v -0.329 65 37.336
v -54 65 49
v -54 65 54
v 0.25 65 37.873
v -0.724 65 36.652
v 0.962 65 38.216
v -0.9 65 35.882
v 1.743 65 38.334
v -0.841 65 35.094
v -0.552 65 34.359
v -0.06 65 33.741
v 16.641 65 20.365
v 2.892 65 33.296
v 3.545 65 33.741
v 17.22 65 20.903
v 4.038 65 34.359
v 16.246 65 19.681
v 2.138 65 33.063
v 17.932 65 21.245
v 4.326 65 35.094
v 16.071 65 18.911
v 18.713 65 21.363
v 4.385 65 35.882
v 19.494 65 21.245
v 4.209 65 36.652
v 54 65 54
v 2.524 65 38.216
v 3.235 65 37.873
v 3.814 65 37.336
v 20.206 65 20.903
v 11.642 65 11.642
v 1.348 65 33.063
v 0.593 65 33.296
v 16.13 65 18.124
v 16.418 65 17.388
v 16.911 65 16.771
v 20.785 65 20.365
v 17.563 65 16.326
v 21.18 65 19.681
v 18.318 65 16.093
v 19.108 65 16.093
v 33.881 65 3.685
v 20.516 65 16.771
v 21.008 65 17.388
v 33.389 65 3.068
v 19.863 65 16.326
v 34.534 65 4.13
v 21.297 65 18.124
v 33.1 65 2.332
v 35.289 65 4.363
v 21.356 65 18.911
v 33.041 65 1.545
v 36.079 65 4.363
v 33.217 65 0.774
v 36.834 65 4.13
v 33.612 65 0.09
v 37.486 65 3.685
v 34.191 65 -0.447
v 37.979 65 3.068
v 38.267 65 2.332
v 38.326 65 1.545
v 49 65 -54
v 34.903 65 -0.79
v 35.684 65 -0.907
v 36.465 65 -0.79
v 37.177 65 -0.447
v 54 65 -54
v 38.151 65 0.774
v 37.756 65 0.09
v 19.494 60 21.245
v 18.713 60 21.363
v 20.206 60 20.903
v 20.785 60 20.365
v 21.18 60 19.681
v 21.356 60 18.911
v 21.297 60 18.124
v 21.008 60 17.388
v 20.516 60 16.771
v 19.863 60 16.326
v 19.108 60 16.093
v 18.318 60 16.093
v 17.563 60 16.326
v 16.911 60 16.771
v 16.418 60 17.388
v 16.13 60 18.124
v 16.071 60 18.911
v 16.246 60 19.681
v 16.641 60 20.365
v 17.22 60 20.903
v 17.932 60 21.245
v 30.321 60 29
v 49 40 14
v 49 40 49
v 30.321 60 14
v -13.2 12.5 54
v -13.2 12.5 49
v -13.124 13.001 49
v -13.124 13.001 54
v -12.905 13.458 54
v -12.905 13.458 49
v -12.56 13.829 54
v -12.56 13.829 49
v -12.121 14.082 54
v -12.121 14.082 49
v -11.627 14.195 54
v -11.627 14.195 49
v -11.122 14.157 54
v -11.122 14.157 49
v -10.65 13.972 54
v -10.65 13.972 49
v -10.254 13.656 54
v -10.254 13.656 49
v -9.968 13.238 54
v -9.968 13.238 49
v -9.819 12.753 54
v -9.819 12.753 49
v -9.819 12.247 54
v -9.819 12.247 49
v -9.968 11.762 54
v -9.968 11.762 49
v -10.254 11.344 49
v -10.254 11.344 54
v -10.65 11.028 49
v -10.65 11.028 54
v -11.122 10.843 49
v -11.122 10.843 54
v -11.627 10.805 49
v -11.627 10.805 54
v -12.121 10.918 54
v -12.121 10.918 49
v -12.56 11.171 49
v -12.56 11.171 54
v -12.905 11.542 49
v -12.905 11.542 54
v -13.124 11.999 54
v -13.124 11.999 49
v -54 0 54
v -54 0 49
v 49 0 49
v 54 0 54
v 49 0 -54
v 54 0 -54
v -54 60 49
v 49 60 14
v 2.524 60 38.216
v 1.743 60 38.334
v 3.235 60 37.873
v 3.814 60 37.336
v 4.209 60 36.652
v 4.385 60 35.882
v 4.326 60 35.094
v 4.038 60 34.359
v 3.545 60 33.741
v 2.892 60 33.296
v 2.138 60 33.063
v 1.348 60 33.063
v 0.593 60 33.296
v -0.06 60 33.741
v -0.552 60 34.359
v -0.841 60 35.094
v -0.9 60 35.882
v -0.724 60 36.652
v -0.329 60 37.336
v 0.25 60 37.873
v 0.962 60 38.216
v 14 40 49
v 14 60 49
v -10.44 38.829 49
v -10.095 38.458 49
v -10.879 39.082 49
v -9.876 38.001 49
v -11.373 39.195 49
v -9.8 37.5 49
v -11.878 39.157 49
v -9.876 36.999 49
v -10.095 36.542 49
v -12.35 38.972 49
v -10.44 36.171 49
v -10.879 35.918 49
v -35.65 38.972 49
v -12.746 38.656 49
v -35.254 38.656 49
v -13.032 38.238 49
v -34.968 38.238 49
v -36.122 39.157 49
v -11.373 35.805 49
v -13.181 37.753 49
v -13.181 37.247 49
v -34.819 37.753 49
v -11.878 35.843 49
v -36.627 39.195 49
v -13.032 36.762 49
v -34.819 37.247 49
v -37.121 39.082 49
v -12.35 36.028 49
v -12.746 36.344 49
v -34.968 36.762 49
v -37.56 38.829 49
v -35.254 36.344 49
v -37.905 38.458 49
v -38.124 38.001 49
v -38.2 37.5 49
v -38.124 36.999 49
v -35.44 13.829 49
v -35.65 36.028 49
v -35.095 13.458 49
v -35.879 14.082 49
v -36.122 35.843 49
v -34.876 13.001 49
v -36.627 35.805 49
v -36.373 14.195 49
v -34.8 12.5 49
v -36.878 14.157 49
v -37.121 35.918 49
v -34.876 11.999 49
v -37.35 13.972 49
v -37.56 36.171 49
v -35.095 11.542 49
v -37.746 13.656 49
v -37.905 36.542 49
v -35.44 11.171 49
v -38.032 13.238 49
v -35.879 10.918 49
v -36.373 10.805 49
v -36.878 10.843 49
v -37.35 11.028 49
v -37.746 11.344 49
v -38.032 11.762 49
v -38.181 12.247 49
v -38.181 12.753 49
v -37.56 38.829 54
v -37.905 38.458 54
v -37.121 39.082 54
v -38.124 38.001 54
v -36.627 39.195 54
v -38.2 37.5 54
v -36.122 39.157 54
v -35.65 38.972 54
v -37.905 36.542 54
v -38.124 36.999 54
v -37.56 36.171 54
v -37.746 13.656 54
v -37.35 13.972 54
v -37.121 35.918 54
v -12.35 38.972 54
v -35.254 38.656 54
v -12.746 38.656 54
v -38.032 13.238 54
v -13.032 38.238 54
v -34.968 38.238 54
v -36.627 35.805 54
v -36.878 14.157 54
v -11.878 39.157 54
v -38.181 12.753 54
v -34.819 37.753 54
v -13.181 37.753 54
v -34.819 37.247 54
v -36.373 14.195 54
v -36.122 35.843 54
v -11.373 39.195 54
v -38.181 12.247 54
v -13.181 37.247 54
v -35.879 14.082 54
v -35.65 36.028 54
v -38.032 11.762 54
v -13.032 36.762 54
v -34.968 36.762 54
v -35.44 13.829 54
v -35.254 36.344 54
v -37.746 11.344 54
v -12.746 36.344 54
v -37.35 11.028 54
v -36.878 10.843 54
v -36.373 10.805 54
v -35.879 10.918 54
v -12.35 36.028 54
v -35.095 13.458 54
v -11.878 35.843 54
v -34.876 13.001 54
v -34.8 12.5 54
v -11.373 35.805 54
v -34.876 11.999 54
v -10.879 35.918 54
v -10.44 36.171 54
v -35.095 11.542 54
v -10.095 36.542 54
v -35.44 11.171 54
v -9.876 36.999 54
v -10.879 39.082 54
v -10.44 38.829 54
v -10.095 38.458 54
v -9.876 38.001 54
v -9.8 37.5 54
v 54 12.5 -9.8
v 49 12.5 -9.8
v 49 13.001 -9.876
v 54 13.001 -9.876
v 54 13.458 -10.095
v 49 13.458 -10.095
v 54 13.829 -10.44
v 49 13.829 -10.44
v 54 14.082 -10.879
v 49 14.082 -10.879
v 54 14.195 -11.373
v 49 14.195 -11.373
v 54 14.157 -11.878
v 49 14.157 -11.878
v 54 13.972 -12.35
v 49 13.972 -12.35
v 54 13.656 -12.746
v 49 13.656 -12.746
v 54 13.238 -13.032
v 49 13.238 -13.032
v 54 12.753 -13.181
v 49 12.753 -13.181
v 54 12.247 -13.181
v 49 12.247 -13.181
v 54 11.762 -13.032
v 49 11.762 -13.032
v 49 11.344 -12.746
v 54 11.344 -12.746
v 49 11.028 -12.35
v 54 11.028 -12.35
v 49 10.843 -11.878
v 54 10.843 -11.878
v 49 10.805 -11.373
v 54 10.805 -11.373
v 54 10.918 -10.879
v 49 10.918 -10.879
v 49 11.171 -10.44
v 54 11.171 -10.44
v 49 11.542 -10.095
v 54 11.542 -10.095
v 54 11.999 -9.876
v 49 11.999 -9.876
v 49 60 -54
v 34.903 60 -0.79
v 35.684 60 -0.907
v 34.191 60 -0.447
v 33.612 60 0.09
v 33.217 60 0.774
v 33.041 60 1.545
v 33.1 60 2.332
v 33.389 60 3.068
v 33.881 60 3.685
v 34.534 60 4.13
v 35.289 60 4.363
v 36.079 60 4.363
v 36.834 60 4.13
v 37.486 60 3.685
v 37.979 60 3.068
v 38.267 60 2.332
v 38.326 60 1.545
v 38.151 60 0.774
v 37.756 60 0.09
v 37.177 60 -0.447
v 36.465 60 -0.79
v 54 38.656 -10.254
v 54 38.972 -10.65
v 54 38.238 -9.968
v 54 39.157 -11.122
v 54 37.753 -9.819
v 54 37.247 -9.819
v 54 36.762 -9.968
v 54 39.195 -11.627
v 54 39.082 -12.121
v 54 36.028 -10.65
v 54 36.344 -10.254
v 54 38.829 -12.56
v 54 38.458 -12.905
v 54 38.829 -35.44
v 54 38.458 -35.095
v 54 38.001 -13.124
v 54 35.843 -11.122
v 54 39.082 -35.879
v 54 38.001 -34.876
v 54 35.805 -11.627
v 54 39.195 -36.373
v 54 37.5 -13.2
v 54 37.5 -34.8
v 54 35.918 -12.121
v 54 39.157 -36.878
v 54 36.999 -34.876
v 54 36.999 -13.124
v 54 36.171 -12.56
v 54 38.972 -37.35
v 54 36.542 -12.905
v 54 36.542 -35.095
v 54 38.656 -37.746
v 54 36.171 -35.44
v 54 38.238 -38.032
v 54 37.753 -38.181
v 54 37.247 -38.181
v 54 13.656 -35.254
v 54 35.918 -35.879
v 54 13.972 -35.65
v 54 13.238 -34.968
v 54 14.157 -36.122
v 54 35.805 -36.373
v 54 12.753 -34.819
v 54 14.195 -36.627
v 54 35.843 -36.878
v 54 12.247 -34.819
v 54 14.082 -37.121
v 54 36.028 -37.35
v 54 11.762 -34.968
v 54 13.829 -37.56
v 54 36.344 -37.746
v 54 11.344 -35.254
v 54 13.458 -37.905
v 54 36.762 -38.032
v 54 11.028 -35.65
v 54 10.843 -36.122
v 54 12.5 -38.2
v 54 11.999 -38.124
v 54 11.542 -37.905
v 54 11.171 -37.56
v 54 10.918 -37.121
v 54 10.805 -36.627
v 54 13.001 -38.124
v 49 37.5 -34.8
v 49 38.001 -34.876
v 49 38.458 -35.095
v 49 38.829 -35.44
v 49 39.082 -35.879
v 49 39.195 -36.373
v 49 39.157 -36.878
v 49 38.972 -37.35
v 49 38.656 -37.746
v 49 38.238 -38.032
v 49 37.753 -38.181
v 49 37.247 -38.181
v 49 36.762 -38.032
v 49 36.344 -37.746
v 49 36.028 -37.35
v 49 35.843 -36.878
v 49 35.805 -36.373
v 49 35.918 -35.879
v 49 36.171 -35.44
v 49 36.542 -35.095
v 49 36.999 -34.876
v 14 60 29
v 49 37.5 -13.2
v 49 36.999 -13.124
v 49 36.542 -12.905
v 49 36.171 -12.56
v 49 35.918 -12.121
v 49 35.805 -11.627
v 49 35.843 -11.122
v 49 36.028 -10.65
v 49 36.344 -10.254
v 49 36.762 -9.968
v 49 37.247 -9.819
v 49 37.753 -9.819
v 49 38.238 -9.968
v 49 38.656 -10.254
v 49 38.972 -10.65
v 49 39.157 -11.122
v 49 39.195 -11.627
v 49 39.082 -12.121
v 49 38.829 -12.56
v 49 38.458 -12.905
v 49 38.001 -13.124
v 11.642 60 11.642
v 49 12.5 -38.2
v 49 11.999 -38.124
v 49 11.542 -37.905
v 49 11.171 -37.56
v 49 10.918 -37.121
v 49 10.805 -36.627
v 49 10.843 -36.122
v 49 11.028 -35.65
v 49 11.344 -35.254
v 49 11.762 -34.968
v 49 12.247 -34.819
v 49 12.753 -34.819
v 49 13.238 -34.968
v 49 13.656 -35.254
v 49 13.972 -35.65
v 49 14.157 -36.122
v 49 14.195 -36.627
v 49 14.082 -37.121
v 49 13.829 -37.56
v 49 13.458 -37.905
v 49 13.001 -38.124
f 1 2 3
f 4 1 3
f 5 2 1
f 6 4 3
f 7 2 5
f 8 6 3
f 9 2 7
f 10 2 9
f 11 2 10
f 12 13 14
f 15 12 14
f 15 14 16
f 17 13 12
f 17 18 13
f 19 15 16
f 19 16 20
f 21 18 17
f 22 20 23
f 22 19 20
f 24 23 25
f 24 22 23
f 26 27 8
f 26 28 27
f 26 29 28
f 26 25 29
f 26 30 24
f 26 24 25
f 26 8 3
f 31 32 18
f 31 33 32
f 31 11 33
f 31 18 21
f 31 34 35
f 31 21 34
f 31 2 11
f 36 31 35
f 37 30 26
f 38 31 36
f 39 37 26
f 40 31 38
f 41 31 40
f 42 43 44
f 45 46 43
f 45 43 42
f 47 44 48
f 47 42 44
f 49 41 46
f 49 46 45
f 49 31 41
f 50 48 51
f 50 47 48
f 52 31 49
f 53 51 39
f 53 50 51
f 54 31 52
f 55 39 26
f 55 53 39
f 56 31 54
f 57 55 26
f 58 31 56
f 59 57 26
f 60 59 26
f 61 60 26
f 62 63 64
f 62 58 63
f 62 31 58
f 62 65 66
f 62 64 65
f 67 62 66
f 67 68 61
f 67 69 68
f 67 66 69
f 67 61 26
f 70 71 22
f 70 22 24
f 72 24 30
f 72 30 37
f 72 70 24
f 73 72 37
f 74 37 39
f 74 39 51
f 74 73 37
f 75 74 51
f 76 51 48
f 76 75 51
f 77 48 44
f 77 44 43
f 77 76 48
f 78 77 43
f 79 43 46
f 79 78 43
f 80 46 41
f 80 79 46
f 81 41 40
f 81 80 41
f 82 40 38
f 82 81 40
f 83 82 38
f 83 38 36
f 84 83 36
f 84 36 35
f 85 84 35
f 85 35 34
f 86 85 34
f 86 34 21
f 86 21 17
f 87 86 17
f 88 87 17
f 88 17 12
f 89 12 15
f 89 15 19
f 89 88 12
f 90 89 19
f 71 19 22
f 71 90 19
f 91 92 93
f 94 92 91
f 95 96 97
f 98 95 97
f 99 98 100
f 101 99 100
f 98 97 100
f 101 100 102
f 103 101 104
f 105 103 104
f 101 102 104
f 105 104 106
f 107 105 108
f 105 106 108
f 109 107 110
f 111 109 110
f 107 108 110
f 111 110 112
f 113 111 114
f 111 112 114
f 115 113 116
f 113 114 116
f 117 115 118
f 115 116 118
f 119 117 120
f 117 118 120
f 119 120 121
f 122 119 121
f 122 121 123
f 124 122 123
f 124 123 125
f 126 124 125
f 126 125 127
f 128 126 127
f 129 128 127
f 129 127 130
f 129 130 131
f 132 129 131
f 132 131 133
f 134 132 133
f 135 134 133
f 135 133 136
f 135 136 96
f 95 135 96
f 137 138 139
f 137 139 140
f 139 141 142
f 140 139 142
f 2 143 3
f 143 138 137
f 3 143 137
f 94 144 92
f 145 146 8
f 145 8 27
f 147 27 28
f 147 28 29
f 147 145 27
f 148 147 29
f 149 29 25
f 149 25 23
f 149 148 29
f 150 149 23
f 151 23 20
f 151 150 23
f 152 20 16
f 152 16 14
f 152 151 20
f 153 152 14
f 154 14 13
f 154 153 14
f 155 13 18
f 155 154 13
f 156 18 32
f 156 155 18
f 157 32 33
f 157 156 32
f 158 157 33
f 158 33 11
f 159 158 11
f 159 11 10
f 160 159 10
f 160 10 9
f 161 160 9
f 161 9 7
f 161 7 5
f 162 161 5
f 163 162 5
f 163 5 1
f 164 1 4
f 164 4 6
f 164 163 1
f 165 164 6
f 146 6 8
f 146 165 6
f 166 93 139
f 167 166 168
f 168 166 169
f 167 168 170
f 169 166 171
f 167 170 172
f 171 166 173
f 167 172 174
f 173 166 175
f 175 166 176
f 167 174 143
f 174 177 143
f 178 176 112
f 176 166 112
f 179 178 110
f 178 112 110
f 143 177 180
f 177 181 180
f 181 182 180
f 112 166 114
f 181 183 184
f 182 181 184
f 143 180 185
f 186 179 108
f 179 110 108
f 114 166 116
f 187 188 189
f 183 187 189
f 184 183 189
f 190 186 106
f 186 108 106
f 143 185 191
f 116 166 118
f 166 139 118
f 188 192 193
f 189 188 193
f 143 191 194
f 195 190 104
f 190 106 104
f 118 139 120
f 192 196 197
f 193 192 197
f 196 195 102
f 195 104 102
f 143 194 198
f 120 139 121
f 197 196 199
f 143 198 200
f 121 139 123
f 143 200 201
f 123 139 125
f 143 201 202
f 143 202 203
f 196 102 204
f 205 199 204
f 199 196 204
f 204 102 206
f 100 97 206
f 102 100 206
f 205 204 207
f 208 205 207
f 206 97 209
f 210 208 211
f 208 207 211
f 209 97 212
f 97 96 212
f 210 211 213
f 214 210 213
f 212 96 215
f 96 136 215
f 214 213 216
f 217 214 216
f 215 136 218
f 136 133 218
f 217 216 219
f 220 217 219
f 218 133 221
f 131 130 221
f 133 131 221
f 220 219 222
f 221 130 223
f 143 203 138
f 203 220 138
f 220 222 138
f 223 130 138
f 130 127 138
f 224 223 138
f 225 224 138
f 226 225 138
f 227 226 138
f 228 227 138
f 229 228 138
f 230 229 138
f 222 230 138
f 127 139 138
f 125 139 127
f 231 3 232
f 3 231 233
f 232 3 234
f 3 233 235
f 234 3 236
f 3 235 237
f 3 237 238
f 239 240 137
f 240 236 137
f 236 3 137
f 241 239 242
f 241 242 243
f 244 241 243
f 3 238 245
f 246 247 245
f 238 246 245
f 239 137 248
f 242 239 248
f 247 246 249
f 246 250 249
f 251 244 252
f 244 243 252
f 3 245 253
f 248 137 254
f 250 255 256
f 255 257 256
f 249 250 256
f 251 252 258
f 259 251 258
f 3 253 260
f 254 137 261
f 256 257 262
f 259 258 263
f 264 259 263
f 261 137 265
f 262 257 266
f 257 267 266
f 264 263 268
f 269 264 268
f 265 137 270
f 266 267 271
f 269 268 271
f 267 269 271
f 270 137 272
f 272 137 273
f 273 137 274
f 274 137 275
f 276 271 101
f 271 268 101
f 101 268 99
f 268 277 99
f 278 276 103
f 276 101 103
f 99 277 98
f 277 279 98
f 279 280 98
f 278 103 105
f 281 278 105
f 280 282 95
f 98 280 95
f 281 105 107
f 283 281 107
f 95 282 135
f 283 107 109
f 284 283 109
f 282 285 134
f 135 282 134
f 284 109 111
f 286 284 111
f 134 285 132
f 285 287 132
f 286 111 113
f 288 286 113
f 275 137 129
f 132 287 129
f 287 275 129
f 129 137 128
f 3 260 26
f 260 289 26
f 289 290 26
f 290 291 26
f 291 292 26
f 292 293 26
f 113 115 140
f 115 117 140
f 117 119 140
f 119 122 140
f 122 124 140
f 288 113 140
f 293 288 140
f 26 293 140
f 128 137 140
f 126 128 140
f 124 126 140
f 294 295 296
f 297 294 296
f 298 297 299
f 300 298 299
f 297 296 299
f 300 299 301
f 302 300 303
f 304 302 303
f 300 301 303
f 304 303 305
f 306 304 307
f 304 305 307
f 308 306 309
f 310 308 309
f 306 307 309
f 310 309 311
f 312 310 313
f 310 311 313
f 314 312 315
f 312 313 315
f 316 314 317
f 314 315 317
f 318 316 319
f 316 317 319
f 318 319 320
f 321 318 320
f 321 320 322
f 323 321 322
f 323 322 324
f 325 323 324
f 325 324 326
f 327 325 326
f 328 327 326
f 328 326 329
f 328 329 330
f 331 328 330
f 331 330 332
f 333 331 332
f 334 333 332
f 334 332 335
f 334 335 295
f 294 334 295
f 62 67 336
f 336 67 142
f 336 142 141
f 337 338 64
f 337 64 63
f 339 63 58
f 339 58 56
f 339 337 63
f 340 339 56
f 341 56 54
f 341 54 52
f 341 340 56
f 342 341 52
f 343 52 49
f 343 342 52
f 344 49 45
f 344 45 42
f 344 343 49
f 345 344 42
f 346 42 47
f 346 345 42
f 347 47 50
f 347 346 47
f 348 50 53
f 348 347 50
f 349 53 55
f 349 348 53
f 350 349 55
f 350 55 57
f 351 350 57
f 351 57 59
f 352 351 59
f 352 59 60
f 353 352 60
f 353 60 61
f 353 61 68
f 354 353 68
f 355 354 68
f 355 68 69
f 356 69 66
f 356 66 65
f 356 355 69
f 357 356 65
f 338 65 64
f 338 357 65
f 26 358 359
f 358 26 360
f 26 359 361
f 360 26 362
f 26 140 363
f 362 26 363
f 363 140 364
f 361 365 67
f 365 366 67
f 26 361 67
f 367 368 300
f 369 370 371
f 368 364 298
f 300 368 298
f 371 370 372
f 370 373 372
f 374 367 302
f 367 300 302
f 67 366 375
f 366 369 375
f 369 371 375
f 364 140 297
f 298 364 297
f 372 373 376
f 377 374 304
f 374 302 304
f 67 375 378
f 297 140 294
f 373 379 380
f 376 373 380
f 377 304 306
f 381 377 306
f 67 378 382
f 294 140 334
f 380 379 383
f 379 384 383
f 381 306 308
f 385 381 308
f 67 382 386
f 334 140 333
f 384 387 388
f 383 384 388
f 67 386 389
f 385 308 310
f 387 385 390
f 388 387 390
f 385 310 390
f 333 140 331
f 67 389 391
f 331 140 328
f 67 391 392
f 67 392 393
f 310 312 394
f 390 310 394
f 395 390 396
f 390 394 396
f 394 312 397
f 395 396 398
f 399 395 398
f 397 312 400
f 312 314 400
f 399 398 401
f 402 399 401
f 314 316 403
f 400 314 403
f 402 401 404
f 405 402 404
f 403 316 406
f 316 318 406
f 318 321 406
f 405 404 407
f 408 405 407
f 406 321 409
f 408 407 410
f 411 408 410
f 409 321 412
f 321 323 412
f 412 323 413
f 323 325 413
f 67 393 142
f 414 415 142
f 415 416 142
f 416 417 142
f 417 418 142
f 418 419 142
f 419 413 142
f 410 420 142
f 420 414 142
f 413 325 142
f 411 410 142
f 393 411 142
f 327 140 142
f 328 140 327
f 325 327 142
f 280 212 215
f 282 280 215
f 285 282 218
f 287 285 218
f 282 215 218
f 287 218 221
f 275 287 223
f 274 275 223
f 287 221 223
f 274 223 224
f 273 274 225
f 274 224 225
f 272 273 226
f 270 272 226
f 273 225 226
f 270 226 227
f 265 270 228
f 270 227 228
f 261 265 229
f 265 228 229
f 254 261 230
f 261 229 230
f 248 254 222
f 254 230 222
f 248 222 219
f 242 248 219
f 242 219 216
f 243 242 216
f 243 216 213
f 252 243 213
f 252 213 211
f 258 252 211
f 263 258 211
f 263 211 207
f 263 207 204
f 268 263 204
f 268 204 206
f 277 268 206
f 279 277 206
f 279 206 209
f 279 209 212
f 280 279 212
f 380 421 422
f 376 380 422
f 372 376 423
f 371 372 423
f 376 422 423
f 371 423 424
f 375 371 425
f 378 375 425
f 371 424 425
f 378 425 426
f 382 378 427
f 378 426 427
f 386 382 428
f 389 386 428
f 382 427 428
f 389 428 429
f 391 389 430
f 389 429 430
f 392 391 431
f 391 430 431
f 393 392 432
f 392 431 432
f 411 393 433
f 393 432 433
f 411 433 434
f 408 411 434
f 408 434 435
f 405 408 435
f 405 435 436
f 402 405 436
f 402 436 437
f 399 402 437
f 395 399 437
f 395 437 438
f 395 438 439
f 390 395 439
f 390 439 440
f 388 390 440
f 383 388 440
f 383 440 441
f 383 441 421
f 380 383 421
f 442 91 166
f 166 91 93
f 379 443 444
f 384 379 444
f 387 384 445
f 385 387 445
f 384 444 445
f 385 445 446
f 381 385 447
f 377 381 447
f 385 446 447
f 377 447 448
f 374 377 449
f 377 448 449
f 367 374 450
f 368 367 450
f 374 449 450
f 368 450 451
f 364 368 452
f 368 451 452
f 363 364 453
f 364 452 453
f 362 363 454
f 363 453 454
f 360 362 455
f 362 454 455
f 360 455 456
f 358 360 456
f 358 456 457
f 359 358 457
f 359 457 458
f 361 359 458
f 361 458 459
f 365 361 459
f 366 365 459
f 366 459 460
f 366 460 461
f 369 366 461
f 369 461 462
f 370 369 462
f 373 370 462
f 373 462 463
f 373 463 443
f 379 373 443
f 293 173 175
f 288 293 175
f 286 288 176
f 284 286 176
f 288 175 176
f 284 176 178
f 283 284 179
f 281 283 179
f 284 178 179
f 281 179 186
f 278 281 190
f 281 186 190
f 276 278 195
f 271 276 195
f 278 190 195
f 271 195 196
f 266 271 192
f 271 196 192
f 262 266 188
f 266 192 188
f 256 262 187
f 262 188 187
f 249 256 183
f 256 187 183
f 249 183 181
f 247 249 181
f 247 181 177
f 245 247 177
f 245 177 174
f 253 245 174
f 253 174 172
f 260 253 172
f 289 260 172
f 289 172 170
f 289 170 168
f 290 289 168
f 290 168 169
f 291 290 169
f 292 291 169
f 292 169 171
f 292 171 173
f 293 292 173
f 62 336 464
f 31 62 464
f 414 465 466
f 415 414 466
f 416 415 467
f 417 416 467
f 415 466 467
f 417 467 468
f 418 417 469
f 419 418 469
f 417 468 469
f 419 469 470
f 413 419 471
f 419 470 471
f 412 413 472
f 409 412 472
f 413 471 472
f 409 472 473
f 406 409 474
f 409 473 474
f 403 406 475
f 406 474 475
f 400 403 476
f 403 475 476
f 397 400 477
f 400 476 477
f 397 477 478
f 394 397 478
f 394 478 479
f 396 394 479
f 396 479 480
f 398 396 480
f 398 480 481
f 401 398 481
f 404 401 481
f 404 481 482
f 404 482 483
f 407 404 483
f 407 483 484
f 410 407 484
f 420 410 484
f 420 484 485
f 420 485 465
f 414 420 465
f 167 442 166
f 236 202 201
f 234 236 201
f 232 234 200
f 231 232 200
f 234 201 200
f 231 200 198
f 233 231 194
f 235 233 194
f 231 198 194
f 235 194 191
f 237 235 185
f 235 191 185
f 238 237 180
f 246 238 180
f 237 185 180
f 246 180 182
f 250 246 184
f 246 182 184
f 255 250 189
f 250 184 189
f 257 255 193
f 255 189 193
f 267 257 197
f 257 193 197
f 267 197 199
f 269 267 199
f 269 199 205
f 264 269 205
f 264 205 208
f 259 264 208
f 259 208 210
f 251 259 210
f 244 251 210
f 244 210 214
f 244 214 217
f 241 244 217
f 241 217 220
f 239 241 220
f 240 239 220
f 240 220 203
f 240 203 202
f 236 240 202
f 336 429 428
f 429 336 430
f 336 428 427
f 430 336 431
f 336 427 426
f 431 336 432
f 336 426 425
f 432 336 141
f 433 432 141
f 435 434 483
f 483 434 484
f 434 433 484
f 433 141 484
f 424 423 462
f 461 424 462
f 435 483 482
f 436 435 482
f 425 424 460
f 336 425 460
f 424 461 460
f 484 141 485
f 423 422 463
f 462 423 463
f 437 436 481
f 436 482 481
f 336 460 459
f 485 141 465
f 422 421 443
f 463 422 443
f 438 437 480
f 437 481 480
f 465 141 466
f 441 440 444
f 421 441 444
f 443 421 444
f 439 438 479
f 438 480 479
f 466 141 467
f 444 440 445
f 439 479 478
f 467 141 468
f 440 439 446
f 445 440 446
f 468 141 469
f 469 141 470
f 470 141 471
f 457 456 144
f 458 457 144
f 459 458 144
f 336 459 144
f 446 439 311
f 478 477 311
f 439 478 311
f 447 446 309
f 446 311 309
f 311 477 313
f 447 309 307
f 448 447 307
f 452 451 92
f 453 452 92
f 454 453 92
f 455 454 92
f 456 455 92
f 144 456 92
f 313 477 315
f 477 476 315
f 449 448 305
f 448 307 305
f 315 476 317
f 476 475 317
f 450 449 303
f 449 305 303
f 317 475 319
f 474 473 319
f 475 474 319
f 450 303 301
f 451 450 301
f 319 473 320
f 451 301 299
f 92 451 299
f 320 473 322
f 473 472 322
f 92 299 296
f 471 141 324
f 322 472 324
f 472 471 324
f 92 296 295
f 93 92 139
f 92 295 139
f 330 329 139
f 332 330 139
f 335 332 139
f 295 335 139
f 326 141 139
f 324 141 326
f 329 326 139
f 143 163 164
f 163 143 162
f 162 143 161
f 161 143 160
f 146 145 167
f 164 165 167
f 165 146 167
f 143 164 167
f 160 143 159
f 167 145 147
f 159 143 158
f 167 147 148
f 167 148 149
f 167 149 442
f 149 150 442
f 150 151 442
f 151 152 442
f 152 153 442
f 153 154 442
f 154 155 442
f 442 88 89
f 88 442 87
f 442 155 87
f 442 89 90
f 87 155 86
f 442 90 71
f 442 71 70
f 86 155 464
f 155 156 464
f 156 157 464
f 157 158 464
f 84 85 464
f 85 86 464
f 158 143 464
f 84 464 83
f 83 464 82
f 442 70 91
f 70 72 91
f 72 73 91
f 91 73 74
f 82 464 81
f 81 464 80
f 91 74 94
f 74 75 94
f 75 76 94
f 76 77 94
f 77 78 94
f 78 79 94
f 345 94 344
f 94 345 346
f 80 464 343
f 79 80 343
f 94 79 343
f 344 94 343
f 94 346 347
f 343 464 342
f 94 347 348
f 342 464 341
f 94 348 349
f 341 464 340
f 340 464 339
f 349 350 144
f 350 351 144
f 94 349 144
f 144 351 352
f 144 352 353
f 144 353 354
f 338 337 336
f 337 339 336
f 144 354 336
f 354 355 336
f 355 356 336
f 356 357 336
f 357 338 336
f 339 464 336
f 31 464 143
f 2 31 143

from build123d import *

# Parameters (mm, degrees)
EXTRUDE_2_DEPTH     = 60
SKETCH_4_R          = 1.7
CUT_EXTRUDE_1_DEPTH = 131.862523283
SKETCH_5_R          = 1.7
CUT_EXTRUDE_2_DEPTH = 131.862523283
SKETCH_6_R          = 2.65
EXTRUDE_4_DEPTH     = 5
RIB_1_REACH         = 110.467
RIB_4_REACH         = 110.467
SKETCH_13_WALL_W    = 247.21744068
SKETCH_13_WALL_H    = 35


with BuildPart() as part:
    # 草图3 → 凸台-拉伸2 (new body)
    with BuildSketch(Plane(origin=(0, 0, 0), x_dir=(1, 0, 0), z_dir=(0, 1, 0))):
        Polygon((54, 54), (49, 54), (49, -49), (-54, -49), (-54, -54), (54, -54), align=None)
    extrude(amount=EXTRUDE_2_DEPTH)

    # 草图4 → 切除-拉伸1 (cut, through all)
    with BuildSketch(Plane(origin=(0, 0, 49), x_dir=(-1, 0, 0), z_dir=(0, 0, -1))):
        with Locations((36.5, 37.5)):
            Circle(SKETCH_4_R)
        with Locations(Location((36.5, 12.5, 0), (0, 0, 180))):
            Circle(SKETCH_4_R)
        with Locations((11.5, 12.5)):
            Circle(SKETCH_4_R)
        with Locations(Location((11.5, 37.5, 0), (0, 0, 180))):
            Circle(SKETCH_4_R)
    extrude(amount=-CUT_EXTRUDE_1_DEPTH, mode=Mode.SUBTRACT)

    # 草图5 → 切除-拉伸2 (cut, through all)
    with BuildSketch(Plane.ZY.offset(-49)):
        with Locations((-36.5, 37.5)):
            Circle(SKETCH_5_R)
        with Locations(Location((-36.5, 12.5, 0), (0, 0, 180))):
            Circle(SKETCH_5_R)
        with Locations((-11.5, 12.5)):
            Circle(SKETCH_5_R)
        with Locations(Location((-11.5, 37.5, 0), (0, 0, 180))):
            Circle(SKETCH_5_R)
    extrude(amount=-CUT_EXTRUDE_2_DEPTH, mode=Mode.SUBTRACT)

    # 草图6 → 凸台-拉伸4 (add)
    with BuildSketch(Plane(origin=(0, 60, 0), x_dir=(1, 0, 0), z_dir=(0, 1, 0))):
        Polygon((-54, -49), (-54, -54), (54, -54), (54, 54), (49, 54), (11.642135624, -11.642135624), align=None)
        with Locations(Location((1.742640687, -35.683766184, 0), (0, 0, 270))):
            Circle(SKETCH_6_R, mode=Mode.SUBTRACT)
        with Locations(Location((35.683766184, -1.742640687, 0), (0, 0, 90))):
            Circle(SKETCH_6_R, mode=Mode.SUBTRACT)
        with Locations(Location((18.713203436, -18.713203436, 0), (0, 0, 270))):
            Circle(SKETCH_6_R, mode=Mode.SUBTRACT)
    extrude(amount=EXTRUDE_4_DEPTH)

    # 草图10 walls → 筋1 (add, up to next)
    with BuildSketch(Plane(origin=(0, 0, 14), x_dir=(-1, 0, 0), z_dir=(0, 0, -1)), mode=Mode.PRIVATE) as rib_1_sk1:
        Polygon((18.817089986, 163.891167178), (-149.296374034, -16.112124581), (-123.717265916, -40.00164588), (44.396198104, 140.00164588), align=None)
    rib_1_tool1 = extrude(rib_1_sk1.sketch, amount=-RIB_1_REACH, mode=Mode.PRIVATE) - part.part
    add(rib_1_tool1.solids().sort_by_distance((39.660533906, 50, 14))[0])

    # 草图13 wall → 筋4 (add, up to next)
    with BuildSketch(Plane(origin=(14, 50, 39), x_dir=(0, -0.707106781187, 0.707106781187), z_dir=(0, 0.707106781187, 0.707106781187)), mode=Mode.PRIVATE) as rib_4_sk1:
        with Locations((0, 17.5)):
            Rectangle(SKETCH_13_WALL_W, SKETCH_13_WALL_H)
    rib_4_tool1 = extrude(rib_4_sk1.sketch, amount=RIB_4_REACH, mode=Mode.PRIVATE) - part.part
    add(rib_4_tool1.solids().sort_by_distance((14, 50, 39))[0])


solid = part.part
